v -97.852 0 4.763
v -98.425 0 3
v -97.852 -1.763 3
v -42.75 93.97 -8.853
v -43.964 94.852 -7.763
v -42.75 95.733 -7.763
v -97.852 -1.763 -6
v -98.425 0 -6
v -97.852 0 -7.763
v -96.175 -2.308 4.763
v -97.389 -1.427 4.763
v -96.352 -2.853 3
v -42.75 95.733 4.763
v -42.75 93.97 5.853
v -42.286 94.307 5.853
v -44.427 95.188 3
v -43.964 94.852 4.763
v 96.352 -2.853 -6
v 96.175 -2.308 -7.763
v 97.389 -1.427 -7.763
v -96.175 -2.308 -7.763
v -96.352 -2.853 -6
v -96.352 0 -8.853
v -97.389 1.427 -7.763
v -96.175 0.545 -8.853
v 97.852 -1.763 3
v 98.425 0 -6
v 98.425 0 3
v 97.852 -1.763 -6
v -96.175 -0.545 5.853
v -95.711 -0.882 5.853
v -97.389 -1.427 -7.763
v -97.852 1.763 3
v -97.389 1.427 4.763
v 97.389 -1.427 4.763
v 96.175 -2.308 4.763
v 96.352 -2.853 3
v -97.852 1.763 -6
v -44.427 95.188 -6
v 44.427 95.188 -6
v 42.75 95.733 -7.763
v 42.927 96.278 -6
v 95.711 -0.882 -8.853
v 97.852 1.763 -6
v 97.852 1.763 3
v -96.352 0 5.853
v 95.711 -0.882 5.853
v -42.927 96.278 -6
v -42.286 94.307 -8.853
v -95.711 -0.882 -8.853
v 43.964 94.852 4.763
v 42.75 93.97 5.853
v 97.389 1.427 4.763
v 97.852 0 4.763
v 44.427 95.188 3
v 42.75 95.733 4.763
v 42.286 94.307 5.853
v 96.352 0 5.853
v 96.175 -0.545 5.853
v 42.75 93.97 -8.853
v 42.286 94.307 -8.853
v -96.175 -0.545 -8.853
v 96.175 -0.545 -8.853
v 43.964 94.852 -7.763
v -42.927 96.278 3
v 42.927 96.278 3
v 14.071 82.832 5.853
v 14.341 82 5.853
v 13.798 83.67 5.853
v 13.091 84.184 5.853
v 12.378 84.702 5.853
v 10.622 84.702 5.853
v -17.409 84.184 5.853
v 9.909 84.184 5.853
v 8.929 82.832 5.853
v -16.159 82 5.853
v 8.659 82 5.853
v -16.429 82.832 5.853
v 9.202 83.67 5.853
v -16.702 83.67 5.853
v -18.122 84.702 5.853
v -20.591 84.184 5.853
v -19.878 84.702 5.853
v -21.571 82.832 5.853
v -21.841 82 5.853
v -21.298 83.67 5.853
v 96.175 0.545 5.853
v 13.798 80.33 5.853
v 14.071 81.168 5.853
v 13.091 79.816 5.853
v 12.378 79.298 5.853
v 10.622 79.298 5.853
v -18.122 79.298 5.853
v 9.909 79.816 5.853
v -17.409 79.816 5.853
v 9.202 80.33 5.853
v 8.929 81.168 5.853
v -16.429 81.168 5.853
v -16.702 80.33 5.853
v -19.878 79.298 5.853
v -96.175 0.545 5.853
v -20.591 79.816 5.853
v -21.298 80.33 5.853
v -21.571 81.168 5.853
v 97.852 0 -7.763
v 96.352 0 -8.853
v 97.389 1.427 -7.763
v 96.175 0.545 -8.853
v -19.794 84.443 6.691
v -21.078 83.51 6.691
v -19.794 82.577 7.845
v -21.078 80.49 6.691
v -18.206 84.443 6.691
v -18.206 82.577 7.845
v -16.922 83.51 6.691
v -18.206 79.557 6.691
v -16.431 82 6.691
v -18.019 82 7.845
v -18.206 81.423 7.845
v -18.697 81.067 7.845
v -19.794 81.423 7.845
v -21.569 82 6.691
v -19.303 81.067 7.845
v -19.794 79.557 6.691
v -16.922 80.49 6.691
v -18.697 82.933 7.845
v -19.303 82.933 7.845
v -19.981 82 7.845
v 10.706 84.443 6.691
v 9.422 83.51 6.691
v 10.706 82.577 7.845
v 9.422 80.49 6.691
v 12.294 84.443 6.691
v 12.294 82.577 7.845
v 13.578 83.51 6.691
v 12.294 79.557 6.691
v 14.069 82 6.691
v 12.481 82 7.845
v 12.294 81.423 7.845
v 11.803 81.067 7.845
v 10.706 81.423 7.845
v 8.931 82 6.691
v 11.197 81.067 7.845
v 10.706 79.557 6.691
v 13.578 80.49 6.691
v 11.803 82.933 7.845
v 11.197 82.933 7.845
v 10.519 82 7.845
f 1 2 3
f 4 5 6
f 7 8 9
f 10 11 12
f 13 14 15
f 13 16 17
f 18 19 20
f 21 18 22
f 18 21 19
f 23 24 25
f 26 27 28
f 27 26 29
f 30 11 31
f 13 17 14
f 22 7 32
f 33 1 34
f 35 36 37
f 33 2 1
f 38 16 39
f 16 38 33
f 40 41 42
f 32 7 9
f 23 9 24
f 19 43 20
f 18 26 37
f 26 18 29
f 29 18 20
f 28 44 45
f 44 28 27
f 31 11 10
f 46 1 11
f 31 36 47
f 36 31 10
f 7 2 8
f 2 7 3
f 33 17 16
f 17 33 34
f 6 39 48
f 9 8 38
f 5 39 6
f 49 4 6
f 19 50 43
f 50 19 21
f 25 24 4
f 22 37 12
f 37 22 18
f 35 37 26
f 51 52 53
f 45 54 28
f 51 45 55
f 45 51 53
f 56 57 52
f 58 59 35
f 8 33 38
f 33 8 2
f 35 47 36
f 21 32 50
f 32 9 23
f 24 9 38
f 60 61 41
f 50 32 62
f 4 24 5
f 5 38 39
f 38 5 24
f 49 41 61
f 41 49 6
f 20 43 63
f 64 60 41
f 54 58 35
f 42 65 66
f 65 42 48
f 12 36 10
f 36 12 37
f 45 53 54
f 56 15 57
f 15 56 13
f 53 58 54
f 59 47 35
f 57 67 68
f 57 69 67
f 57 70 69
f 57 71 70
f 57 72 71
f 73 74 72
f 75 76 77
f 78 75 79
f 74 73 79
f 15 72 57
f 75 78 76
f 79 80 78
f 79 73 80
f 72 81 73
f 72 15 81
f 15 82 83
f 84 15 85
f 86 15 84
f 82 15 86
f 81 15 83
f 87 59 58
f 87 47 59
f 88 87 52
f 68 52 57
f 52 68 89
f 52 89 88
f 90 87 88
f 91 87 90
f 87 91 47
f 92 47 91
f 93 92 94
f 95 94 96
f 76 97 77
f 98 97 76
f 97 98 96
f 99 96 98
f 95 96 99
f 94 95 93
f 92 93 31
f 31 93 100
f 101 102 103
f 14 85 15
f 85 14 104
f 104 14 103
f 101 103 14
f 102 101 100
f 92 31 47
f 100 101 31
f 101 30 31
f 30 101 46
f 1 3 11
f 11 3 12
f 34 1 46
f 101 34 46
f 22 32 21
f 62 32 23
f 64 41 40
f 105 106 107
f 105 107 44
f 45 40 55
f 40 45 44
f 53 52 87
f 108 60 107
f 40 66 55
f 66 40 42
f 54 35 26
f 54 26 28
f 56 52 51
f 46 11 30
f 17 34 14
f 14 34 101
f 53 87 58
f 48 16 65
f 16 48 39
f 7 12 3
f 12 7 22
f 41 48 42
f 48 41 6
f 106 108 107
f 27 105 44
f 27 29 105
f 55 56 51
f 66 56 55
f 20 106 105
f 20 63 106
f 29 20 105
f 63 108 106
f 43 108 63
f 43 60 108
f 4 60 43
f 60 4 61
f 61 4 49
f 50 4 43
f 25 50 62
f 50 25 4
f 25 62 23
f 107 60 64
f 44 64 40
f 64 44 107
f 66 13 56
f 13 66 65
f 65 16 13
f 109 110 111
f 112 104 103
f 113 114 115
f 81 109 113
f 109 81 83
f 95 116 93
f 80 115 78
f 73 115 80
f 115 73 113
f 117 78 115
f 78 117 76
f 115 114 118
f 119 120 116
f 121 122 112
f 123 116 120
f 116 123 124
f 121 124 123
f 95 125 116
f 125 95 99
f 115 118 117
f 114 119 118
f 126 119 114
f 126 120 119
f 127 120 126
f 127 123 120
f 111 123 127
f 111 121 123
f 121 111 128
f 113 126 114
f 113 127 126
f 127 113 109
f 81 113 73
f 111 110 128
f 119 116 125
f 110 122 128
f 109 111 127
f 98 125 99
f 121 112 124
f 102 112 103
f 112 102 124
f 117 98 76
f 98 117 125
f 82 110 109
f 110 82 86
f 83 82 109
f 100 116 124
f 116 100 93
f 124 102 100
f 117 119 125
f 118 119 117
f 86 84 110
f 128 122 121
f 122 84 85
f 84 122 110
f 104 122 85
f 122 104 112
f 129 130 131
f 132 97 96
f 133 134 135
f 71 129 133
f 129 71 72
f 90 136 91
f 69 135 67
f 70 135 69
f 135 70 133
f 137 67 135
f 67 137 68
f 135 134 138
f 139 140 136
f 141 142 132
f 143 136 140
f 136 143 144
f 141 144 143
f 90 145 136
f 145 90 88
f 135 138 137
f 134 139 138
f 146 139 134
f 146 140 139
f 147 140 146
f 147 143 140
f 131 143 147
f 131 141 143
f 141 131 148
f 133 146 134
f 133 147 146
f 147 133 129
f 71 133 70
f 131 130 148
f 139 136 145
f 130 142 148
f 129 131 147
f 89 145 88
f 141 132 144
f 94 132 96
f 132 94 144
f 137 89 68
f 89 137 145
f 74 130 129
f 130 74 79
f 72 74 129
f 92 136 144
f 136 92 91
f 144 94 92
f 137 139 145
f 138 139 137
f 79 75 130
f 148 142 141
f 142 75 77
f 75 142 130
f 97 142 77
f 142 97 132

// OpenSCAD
// This is a Bench Plate Mounting Block. The Bent Plate design
// is purely experimental. It will be difficult for most printers to
// render due to the extreme overhang.
//
// Warning -- some sanding and fitting may be required.
//
// This is licensed under the creative commons+attribution license
//
// This design was inspired by dhench's Lee Bench Plates design at
// https://www.thingiverse.com/thing:2933054
//
// To fulfill the attribution requirement, please link to:
// http://www.thingiverse.com/thing:3028704

/* [Main] */

// Number of facets (larger numbers provide better smoothing)
$fn=10;

// Define shape of object
shape=0;//[0:Block,1:Bent Plate]

// Define press type
device=0;//[0:Alignment Tabs Only,1:Classic Turret Press,2:Load-Master,3:Breech Lock Reloader Press,4:Breech Lock Challenger,5:Breech Lock Classic Cast,6:Classic Cast,7:Pro 1000,8:4 Hole Value Turret,9:2018+ Pro 1000,10:2018+ 4 Hole Value Turret,11:RCBS Rock Chucker,12:RCBS Partner,13:Brass Prep Station Mk I,14:Brass Prep Station Mk II,15:Brass Prep Station Mk III]

// Bolt hole diameter in mm
bolt_diameter=6.35;

// Bolt head diameter in mm
head_diameter=4*bolt_diameter;

// Bolt head thickness in mm
head_thickness=3.0;

// Base plate thickness in mm
thickness=18.0;

// Corner radius in mm
radius=3.0;

// Bottom base plate width in mm
bottom_width=196.85;

// Top base plate width in mm
top_width=90.0;

// Base plate length (top to bottom) in mm
length=96.425;

//rotation_angle=atan((bottom_width-top_width)/2*length)-30;

module lable(text_input)
{
    #translate([bottom_width/2-2*radius,0,0]) rotate([90,180,0]) linear_extrude(radius)
    {
        text(text_input,size=5,center=false);
    }
}

module corner(corner_height,corner_radius)
{
    hull()
    {
        translate([0,0,-(corner_height-4*corner_radius)]) sphere(r=corner_radius,center=true);
        translate([0,0,corner_radius]) sphere(r=corner_radius,center=true);
    }
}

module brace(brace_side,brace_radius)
{
    hull()
    {
        translate([0,-brace_side/2,0]) sphere(r=brace_radius,center=true);
        translate([0,brace_side/2],0)  sphere(r=brace_radius,center=true);
        translate([0,-brace_side/2,brace_side/2]) sphere(r=brace_radius,center=true);
        translate([0,brace_side/2,brace_side/2])  sphere(r=brace_radius,center=true);
        translate([brace_side/2,-brace_side/2,0]) sphere(r=brace_radius,center=true);
        translate([brace_side/2,brace_side/2],0)  sphere(r=brace_radius,center=true);
        
    }
}

module base()
{
    if(shape==0)
    {
        hull()
        {
            translate([-(bottom_width/2-radius),0,0])   corner(thickness,radius);
            translate([(bottom_width/2-radius),0,0])  corner(thickness,radius);
            translate([-(top_width/2-radius),(length-radius),0])  corner(thickness,radius);
            translate([(top_width/2-radius),(length-radius),0]) corner(thickness,radius);
        }
        // Add alignment tabs
        translate([-19,82,thickness/2-(bolt_diameter/2+1)])  sphere(r=bolt_diameter/2,center=true);
        translate([11.5,82,thickness/2-(bolt_diameter/2+1)]) sphere(r=bolt_diameter/2,center=true);
    }
    if(shape==1)
    {   
        union()
        {
            hull()
            {
                translate([-(bottom_width/2-radius),0,0])   corner(thickness,radius);
                translate([-(top_width/2-radius),(length-radius),0])  corner(thickness,radius);
            }
            hull()
            {
                translate([(bottom_width/2-radius),0,0])  corner(thickness,radius);
                translate([(top_width/2-radius),(length-radius),0]) corner(thickness,radius);
            }
            hull()
            {
                translate([-(bottom_width/2-radius),0,-head_thickness/2]) corner(radius,radius/2);
                translate([(bottom_width/2-radius),0,-head_thickness/2])  corner(radius,radius/2);
                translate([-(top_width/2-radius),(length-radius),-head_thickness/2]) corner(radius,radius/2);
                translate([(top_width/2-radius),(length-radius-radius),-head_thickness/2])  corner(radius,radius/2);
            }
            // Render braces
            translate([(bottom_width-top_width)/sqrt(3)-6,2*length/3,-radius/2]) rotate([0,90,211]) brace(5,radius);
            translate([-((bottom_width-top_width)/sqrt(3)-6),2*length/3,-radius/2]) rotate([0,90,-29]) brace(5,radius);
            translate([(4*(bottom_width-top_width)/sqrt(3)/3-8),length/3,-radius/2]) rotate([0,90,211]) brace(5,radius);
            translate([-(4*(bottom_width-top_width)/sqrt(3)/3-8),length/3,-radius/2]) rotate([0,90,-29]) brace(5,radius);
        }
    }
}

module ctp()
{
    union()
    {
        translate([-47.0,14.0,0]) cube([bolt_diameter+0.5,bolt_diameter+0.5,thickness+radius],center=true);
        translate([71.0,14.0,0])  cube([bolt_diameter+0.5,bolt_diameter+0.5,thickness+radius],center=true);
        translate([11.5,82,0])    cube([bolt_diameter+0.5,bolt_diameter+0.5,thickness+radius],center=true);
        if(shape==0)
        {
            lable("Lee Classic Turret Press");
            // Countersink carriage bolts
            translate([-47.0,14.0,head_thickness]) cylinder(r=head_diameter/2,h=head_thickness,center=false);
            translate([71.0,14.0,head_thickness])  cylinder(r=head_diameter/2,h=head_thickness,center=false);
            translate([11.5,82.0,head_thickness])  cylinder(r=head_diameter/2,h=head_thickness,center=false);
        }
    }
}

module lm()
{
    union()
    {
        translate([-70.0,10.0,0]) cube([bolt_diameter+0.5,bolt_diameter+0.5,thickness+radius],center=true);
        translate([32.0,10.0,0])  cube([bolt_diameter+0.5,bolt_diameter+0.5,thickness+radius],center=true);
        translate([-19.0,82.0,0]) cube([bolt_diameter+0.5,bolt_diameter+0.5,thickness+radius],center=true);
        if(shape==0)
        {
            lable("Lee Load-Master");
            // Countersink carriage bolts
            translate([-70.0,10.0,head_thickness]) cylinder(r=head_diameter/2,h=head_thickness,center=false);
            translate([32.0,10.0,head_thickness])  cylinder(r=head_diameter/2,h=head_thickness,center=false);
            translate([-19.0,82.0,head_thickness]) cylinder(r=head_diameter/2,h=head_thickness,center=false);   
        }
    }
}

module rp()
{
    union()
    {
        translate([-19.0,10.0,0]) cube([bolt_diameter+0.5,bolt_diameter+0.5,thickness+radius],center=true);
        translate([19.0,10.0,0])  cube([bolt_diameter+0.5,bolt_diameter+0.5,thickness+radius],center=true);
        translate([0.0,72.0,0])   cube([bolt_diameter+0.5,bolt_diameter+0.5,thickness+radius],center=true);
        if(shape==0)
        {
            lable("Lee Breech Lock Reloader Press");
            // Countersink carriage bolts
            translate([-19.0,10.0,head_thickness]) cylinder(r=head_diameter/2+0.5,h=head_thickness,center=false);
            translate([19.0,10.0,head_thickness])  cylinder(r=head_diameter/2+0.5,h=head_thickness,center=false);
            translate([0.0,72.0,head_thickness])   cylinder(r=head_diameter/2+0.5,h=head_thickness,center=false);
        }
    }
}

module blc()
{
    union()
    {
        translate([-37.0,37.0,0]) cube([bolt_diameter+0.5,bolt_diameter+0.5,thickness+radius],center=true);
        translate([8.0,13.0,0])   cube([bolt_diameter+0.5,bolt_diameter+0.5,thickness+radius],center=true);
        translate([-15.0,67.0,0]) cube([bolt_diameter+0.5,bolt_diameter+0.5,thickness+radius],center=true);
        if(shape==0)
        {
            lable("Lee Breech Lock Challenger Press");
            // Countersink carriage bolts
            translate([-37.0,37.0,head_thickness]) cylinder(r=head_diameter/2,h=head_thickness,center=false);
            translate([8.0,13.0,head_thickness])   cylinder(r=head_diameter/2,h=head_thickness,center=false);
            translate([-15.0,67.0,head_thickness]) cylinder(r=head_diameter/2,h=head_thickness,center=false);
        }
    }
}

module blcc()
{
    union()
    {
        translate([-53.0,39.5,0]) cube([bolt_diameter+0.5,bolt_diameter+0.5,thickness+radius],center=true);
        translate([32.0,10.0,0])  cube([bolt_diameter+0.5,bolt_diameter+0.5,thickness+radius],center=true);
        translate([-19.0,82.0,0]) cube([bolt_diameter+0.5,bolt_diameter+0.5,thickness+radius],center=true);
        if(shape==0)
        {
            lable("Lee Breech Lock Classic Cast");
            // Countersink carriage bolts
            translate([-53.0,39.5,head_thickness]) cylinder(r=head_diameter/2,h=head_thickness,center=false);
            translate([32.0,10.0,head_thickness])  cylinder(r=head_diameter/2,h=head_thickness,center=false);
            translate([-19.0,82.0,head_thickness]) cylinder(r=head_diameter/2,h=head_thickness,center=false);   
        }
    }
}

module cc()
{
    union()
    {
        translate([-70.0,10.0,0]) cube([bolt_diameter+0.5,bolt_diameter+0.5,thickness+radius],center=true);
        translate([32.0,10.0,0])  cube([bolt_diameter+0.5,bolt_diameter+0.5,thickness+radius],center=true);
        translate([-19.0,82.0,0]) cube([bolt_diameter+0.5,bolt_diameter+0.5,thickness+radius],center=true);
        if(shape==0)
        {
            lable("Lee Classic Cast");
            // Countersink carriage bolts
            translate([-70.0,10.0,head_thickness]) cylinder(r=head_diameter/2,h=head_thickness,center=false);
            translate([32.0,10.0,head_thickness])  cylinder(r=head_diameter/2,h=head_thickness,center=false);
            translate([-19.0,82.0,head_thickness]) cylinder(r=head_diameter/2,h=head_thickness,center=false);
        }
    }
}

module pro()
{
    union()
    {
        translate([-70.0,10.0,0]) cube([bolt_diameter+0.5,bolt_diameter+0.5,thickness+radius],center=true);
        translate([32.0,10.0,0])  cube([bolt_diameter+0.5,bolt_diameter+0.5,thickness+radius],center=true);
        translate([-19.0,82.0,0]) cube([bolt_diameter+0.5,bolt_diameter+0.5,thickness+radius],center=true);
        if(shape==0)
        {
            lable("Lee Pro 1000");
            // Countersink carriage bolts
            translate([-70.0,10.0,head_thickness]) cylinder(r=head_diameter/2,h=head_thickness,center=false);
            translate([32.0,10.0,head_thickness])  cylinder(r=head_diameter/2,h=head_thickness,center=false);
            translate([-19.0,82.0,head_thickness]) cylinder(r=head_diameter/2,h=head_thickness,center=false);
        }
    }
}

module vtp()
{
    union()
    {
        translate([-70.0,10.0,0]) cube([bolt_diameter+0.5,bolt_diameter+0.5,thickness+radius],center=true);
        translate([32.0,10.0,0])  cube([bolt_diameter+0.5,bolt_diameter+0.5,thickness+radius],center=true);
        translate([-19.0,82.0,0]) cube([bolt_diameter+0.5,bolt_diameter+0.5,thickness+radius],center=true);
        if(shape==0)
        {
            lable("Lee Value Turret Press");
            // Countersink carriage bolts
            translate([-70.0,10.0,head_thickness]) cylinder(r=head_diameter/2,h=head_thickness,center=false);
            translate([32.0,10.0,head_thickness])  cylinder(r=head_diameter/2,h=head_thickness,center=false);
            translate([-19.0,82.0,head_thickness]) cylinder(r=head_diameter/2,h=head_thickness,center=false);
        }
    }
}

module lee18vtp()
{
    union()
    {
        translate([-59.0,14.0,0]) cube([bolt_diameter+0.5,bolt_diameter+0.5,thickness+radius],center=true);
        translate([32.0,10.0,0])  cube([bolt_diameter+0.5,bolt_diameter+0.5,thickness+radius],center=true);
        translate([-15.0,67.0,0]) cube([bolt_diameter+0.5,bolt_diameter+0.5,thickness+radius],center=true);
        if(shape==0)
        {
            lable("2018+ Lee Value Turret Press");
            // Countersink carriage bolts
            translate([-59.0,14.0,head_thickness]) cylinder(r=head_diameter/2,h=head_thickness,center=false);
            translate([32.0,10.0,head_thickness])  cylinder(r=head_diameter/2,h=head_thickness,center=false);
            translate([-15.0,67.0,head_thickness]) cylinder(r=head_diameter/2,h=head_thickness,center=false);
         }
    }
}


module rc()
{
    union()
    {
        translate([-34.0,42.0,0]) cube([bolt_diameter+0.5,bolt_diameter+0.5,thickness+radius],center=true);
        translate([34.0,42.0,0])  cube([bolt_diameter+0.5,bolt_diameter+0.5,thickness+radius],center=true);
        if(shape==0)
        {
            lable("RCBS Rock Chucker");
            // Countersink carriage bolts
            translate([-34.0,42.0,head_thickness]) cylinder(r=head_diameter/2,h=head_thickness,center=false);
            translate([34.0,42.0,head_thickness])  cylinder(r=head_diameter/2,h=head_thickness,center=false);
        }
    }
}

module partner()
{
    union()
    {
        translate([-21.0,19.0,0]) cube([bolt_diameter+0.5,bolt_diameter+0.5,thickness+radius],center=true);
        translate([21.0,19.0,0])  cube([bolt_diameter+0.5,bolt_diameter+0.5,thickness+radius],center=true);
        translate([0.0,65.0,0]) cube([bolt_diameter+0.5,bolt_diameter+0.5,thickness+radius],center=true);
        if(shape==0)
        {
            lable("RCBS Partner");
            // Countersink carriage bolts
            translate([-21.0,19.0,head_thickness]) cylinder(r=head_diameter/2,h=head_thickness,center=false);
            translate([21.0,19.0,head_thickness])  cylinder(r=head_diameter/2,h=head_thickness,center=false);
            translate([0.0,65.0,head_thickness]) cylinder(r=head_diameter/2,h=head_thickness,center=false);
        }
    }
}

module brassprep_a()
{
    union()
    {
        #translate([0,65.0,0]) cylinder($fn=100,r=6.35,h=thickness+radius,center=true);
        #translate([-20,40.0,0]) cylinder($fn=100,r=7.2,h=thickness+radius,center=true);
        #translate([-20,40.0,-0.75*thickness]) cylinder($fn=100,r=8.86,h=thickness+radius,center=true);
        #translate([20,40.0,0]) cylinder($fn=100,r=7.2,h=thickness+radius,center=true);
        #translate([20,40.0,-0.75*thickness]) cylinder($fn=100,r=8.86,h=thickness+radius,center=true);
        #translate([0,15.0,-thickness]) cylinder($fn=6,r=3.65,h=thickness+radius,center=false);
        #translate([20,15.0,-thickness]) cylinder($fn=6,r=3.65,h=thickness+radius,center=false);
        #translate([-20,15.0,-thickness]) cylinder($fn=6,r=3.65,h=thickness+radius,center=false);
        #translate([40,15.0,-thickness]) cylinder($fn=6,r=3.65,h=thickness+radius,center=false);
        #translate([-40,15.0,-thickness]) cylinder($fn=6,r=3.65,h=thickness+radius,center=false);
        #translate([60,15.0,-thickness]) cylinder($fn=6,r=3.65,h=thickness+radius,center=false);
        #translate([-60,15.0,-thickness]) cylinder($fn=6,r=3.65,h=thickness+radius,center=false);
        if(shape==0)
        {
            lable("Brass Prep Station MK I");
        }
    }
}
module brassprep_b()
{
    union()
    {
        #translate([0,65.0,0]) cylinder($fn=100,r=6.35,h=thickness+radius+1,center=true);
        #translate([-20,40.0,0]) cylinder($fn=6,r=3.65,h=thickness+radius+1,center=true);
        #translate([20,40.0,0]) cylinder($fn=6,r=3.65,h=thickness+radius+1,center=true);
        
        #translate([0,15.0,-thickness]) cylinder($fn=6,r=3.65,h=thickness+radius+1,center=false);
        #translate([20,15.0,-thickness]) cylinder($fn=6,r=3.65,h=thickness+radius+1,center=false);
        #translate([-20,15.0,-thickness]) cylinder($fn=6,r=3.65,h=thickness+radius+1,center=false);
        #translate([40,15.0,-thickness]) cylinder($fn=6,r=3.65,h=thickness+radius+1,center=false);
        #translate([-40,15.0,-thickness]) cylinder($fn=6,r=3.65,h=thickness+radius+1,center=false);
        #translate([60,15.0,-thickness]) cylinder($fn=6,r=3.65,h=thickness+radius+1,center=false);
        #translate([-60,15.0,-thickness]) cylinder($fn=6,r=3.65,h=thickness+radius+1,center=false);
        if(shape==0)
        {
            lable("Brass Prep Station Mk II");
        }
    }
}

module brassprep_c()
{
    union()
    {
        #translate([0,65.0,0]) cylinder($fn=6,r=3.65,h=thickness+radius+1,center=true);
        #translate([-20,40.0,0]) cylinder($fn=6,r=3.65,h=thickness+radius+1,center=true);
        #translate([20,40.0,0]) cylinder($fn=6,r=3.65,h=thickness+radius+1,center=true);
        
        #translate([0,15.0,-thickness]) cylinder($fn=6,r=3.65,h=thickness+radius+1,center=false);
        #translate([20,15.0,-thickness]) cylinder($fn=6,r=3.65,h=thickness+radius+1,center=false);
        #translate([-20,15.0,-thickness]) cylinder($fn=6,r=3.65,h=thickness+radius+1,center=false);
        #translate([40,15.0,-thickness]) cylinder($fn=6,r=3.65,h=thickness+radius+1,center=false);
        #translate([-40,15.0,-thickness]) cylinder($fn=6,r=3.65,h=thickness+radius+1,center=false);
        #translate([60,15.0,-thickness]) cylinder($fn=6,r=3.65,h=thickness+radius+1,center=false);
        #translate([-60,15.0,-thickness]) cylinder($fn=6,r=3.65,h=thickness+radius+1,center=false);
        if(shape==0)
        {
            lable("Brass Prep Station Mk III");
        }
    }
}
//%translate([0,length/2,-thickness]) import_stl("./LeePlateComp.stl");

difference() // drill holes using correct pattern for each device
{
    base();
    if(device==1){ ctp(); }
    if(device==2){ lm(); }
    if(device==3){ rp(); }
    if(device==4){ blc(); }
    if(device==5){ blcc(); }
    if(device==6){ cc(); }
    if(device==7){ pro(); }
    if(device==8){ vtp(); }
    if(device==9){ lee18pro(); }
    if(device==10){ lee18vtp(); }
    if(device==11){ rc(); }
    if(device==12){ partner(); }
    if(device==13){ brassprep_a(); }
    if(device==14){ brassprep_b(); }
    if(device==15){ brassprep_c(); }
}
